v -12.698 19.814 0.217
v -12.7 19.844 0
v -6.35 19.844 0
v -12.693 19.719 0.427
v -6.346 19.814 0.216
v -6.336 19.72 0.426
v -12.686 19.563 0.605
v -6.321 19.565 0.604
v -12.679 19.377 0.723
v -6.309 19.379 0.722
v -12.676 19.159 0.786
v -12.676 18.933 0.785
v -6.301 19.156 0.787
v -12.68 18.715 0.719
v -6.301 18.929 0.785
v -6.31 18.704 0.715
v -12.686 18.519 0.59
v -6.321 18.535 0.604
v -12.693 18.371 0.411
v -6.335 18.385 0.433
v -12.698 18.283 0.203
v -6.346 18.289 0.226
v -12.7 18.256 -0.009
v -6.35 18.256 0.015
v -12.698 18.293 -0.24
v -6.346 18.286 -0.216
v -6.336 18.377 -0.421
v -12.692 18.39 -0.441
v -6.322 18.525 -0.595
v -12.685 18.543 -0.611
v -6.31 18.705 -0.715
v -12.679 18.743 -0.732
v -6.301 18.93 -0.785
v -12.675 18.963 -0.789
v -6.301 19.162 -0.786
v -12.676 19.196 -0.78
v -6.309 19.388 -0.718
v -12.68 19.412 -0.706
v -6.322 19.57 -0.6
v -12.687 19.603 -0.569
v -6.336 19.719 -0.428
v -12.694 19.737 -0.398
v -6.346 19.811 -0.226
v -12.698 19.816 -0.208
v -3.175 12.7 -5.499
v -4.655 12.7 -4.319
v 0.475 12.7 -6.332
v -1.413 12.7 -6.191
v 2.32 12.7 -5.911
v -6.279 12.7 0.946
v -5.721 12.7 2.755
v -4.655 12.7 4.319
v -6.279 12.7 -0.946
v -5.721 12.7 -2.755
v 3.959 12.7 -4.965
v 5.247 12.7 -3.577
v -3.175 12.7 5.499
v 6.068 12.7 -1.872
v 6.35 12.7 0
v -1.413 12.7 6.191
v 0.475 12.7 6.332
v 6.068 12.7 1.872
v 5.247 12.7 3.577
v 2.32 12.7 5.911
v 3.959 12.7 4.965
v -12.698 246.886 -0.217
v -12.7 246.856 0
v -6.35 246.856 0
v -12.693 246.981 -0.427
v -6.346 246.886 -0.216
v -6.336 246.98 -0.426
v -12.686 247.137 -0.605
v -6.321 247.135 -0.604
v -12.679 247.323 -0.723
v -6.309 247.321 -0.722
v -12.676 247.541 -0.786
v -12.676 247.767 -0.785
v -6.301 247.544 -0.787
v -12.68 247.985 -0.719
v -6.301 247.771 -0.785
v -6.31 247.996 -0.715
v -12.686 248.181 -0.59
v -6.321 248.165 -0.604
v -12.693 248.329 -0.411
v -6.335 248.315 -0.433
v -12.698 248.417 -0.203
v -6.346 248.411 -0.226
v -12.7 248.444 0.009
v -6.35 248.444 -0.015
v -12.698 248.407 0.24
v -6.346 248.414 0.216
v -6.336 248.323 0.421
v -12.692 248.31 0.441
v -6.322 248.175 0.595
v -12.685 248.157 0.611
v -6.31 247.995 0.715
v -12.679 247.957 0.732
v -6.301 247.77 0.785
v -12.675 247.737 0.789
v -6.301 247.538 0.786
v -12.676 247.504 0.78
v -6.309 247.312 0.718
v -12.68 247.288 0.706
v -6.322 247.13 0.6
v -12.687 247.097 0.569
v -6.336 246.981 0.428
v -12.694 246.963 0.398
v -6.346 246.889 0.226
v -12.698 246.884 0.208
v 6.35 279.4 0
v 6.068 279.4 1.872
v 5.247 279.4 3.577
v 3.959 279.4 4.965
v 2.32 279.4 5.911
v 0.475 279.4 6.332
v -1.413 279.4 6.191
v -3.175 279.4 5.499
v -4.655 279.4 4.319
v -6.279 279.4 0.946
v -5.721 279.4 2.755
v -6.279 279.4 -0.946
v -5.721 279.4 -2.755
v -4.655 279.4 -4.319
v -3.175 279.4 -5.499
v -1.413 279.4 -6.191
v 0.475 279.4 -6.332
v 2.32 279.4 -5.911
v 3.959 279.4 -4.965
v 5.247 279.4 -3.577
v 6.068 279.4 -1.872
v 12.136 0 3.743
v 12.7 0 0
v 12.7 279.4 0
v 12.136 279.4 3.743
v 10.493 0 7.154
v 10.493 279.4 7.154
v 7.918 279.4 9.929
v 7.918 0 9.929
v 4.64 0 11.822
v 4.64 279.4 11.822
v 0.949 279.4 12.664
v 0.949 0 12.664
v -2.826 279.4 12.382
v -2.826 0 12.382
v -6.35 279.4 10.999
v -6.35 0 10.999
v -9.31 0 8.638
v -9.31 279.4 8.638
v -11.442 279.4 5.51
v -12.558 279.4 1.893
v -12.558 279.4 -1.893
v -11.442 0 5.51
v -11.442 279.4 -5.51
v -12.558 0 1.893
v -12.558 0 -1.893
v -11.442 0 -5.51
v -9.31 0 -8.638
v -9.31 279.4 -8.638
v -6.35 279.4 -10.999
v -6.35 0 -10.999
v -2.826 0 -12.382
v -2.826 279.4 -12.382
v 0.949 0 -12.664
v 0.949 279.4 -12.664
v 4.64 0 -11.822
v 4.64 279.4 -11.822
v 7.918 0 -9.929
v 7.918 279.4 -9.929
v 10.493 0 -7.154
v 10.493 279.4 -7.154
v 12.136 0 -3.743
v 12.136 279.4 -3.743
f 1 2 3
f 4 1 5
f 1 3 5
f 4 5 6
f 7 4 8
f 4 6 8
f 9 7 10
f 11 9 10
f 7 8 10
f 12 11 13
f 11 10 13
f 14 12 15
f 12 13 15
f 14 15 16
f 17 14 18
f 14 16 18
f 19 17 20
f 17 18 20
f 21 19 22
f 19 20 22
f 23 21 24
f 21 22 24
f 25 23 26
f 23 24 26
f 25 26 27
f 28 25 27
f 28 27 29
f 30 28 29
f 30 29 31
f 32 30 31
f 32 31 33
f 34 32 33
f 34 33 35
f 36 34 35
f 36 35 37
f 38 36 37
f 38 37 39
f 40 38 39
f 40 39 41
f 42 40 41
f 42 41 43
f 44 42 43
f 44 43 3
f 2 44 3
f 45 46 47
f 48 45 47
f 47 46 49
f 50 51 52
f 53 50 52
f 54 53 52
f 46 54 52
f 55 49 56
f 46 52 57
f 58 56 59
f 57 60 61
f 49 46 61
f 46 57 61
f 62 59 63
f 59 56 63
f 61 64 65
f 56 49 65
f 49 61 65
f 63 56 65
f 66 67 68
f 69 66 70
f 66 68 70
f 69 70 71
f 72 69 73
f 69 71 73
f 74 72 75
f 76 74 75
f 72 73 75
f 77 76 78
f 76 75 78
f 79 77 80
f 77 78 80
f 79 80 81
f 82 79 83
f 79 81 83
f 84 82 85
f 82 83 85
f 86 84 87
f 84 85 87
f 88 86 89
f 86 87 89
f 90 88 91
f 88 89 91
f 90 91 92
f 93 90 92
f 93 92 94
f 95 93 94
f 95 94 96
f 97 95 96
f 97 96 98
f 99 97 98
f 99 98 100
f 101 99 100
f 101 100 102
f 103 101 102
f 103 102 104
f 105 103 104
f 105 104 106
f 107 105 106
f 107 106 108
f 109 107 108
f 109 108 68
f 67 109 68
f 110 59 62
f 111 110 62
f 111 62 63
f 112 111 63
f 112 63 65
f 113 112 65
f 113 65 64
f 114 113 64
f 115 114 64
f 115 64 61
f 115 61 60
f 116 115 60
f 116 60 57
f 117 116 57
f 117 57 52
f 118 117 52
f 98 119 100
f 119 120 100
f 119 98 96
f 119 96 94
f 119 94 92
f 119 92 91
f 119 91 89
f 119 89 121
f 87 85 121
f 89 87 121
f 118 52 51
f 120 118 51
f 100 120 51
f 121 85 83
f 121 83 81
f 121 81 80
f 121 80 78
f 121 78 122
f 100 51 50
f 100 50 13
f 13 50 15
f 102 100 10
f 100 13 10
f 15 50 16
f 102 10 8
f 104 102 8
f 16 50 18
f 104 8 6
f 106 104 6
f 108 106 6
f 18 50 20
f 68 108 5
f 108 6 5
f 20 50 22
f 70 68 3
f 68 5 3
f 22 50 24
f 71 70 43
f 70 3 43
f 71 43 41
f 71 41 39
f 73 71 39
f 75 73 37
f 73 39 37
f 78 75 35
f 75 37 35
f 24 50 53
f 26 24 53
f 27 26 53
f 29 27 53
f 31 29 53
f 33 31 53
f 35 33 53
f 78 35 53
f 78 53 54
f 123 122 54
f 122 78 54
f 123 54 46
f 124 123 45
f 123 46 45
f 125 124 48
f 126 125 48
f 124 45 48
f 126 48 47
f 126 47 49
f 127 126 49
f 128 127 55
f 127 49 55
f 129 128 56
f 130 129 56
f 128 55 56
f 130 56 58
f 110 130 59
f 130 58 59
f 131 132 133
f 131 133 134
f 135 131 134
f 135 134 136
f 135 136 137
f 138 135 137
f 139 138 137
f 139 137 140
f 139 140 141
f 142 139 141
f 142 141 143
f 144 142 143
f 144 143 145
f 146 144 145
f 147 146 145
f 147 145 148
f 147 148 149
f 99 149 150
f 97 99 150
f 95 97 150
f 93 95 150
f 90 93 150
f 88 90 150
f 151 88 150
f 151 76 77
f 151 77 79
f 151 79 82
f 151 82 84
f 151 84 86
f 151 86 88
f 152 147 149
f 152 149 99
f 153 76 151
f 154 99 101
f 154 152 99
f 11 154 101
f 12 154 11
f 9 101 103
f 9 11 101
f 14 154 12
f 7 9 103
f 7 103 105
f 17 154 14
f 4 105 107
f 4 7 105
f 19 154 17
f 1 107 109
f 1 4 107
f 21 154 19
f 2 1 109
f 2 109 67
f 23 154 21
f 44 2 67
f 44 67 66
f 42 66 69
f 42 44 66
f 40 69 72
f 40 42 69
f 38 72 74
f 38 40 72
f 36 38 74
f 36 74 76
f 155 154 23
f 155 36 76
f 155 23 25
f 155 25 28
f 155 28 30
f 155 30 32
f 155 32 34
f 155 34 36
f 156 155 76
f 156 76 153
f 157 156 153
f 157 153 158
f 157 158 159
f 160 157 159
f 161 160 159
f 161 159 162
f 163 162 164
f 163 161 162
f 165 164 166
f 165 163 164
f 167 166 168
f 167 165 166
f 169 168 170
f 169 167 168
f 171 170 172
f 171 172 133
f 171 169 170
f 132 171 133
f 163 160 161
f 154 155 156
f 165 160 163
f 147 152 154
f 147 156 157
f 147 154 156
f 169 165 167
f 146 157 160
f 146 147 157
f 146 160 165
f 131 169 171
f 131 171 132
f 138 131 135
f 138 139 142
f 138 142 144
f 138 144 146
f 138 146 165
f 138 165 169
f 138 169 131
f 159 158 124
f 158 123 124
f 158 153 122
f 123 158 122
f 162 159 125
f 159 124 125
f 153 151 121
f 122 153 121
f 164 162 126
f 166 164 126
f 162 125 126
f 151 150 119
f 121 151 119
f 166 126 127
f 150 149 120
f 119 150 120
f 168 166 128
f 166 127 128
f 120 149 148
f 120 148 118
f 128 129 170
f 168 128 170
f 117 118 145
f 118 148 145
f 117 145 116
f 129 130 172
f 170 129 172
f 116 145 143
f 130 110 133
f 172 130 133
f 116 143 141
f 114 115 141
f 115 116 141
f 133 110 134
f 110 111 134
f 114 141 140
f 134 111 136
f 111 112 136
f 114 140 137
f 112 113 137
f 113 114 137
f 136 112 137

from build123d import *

# Parameters (mm, degrees)
F0_R     = 12.7
F0_R_2   = 6.35
F1_DEPTH = 12.7
F2_DEPTH = 279.4
F5_DEPTH = 25.4
F7_DEPTH = 25.4


with BuildPart() as f1:
    # F0 (on Front) → F1 (new body)
    with BuildSketch(Plane.XZ):
        Circle(F0_R)
        Circle(F0_R_2, mode=Mode.SUBTRACT)
        Circle(F0_R_2)
    extrude(amount=-F1_DEPTH)

    # F0 (on Front) → F2 (join)
    with BuildSketch(Plane.XZ):
        Circle(F0_R)
        Circle(F0_R_2, mode=Mode.SUBTRACT)
    extrude(amount=-F2_DEPTH)

    # F4 (on Right) → F5 (cut)
    with BuildSketch(Plane.YZ):
        with BuildLine():
            ThreePointArc((18.25625, 0), (19.05, -0.79375), (19.84375, 0))
            ThreePointArc((19.84375, 0), (19.05, 0.79375), (18.25625, 0))
        make_face()
    extrude(amount=-F5_DEPTH, mode=Mode.SUBTRACT)

    # F6 (on Right) → F7 (cut)
    with BuildSketch(Plane.YZ):
        with BuildLine():
            ThreePointArc((248.44375, 0), (247.65, 0.79375), (246.85625, 0))
            Line((246.85625, 0), (247.65, 0))
            Line((247.65, 0), (248.44375, 0))
        make_face()
        with BuildLine():
            Line((247.65, 0), (246.85625, 0))
            ThreePointArc((246.85625, 0), (247.65, -0.79375), (248.44375, 0))
            Line((248.44375, 0), (247.65, 0))
        make_face()
    extrude(amount=-F7_DEPTH, mode=Mode.SUBTRACT)


solid = f1.part
